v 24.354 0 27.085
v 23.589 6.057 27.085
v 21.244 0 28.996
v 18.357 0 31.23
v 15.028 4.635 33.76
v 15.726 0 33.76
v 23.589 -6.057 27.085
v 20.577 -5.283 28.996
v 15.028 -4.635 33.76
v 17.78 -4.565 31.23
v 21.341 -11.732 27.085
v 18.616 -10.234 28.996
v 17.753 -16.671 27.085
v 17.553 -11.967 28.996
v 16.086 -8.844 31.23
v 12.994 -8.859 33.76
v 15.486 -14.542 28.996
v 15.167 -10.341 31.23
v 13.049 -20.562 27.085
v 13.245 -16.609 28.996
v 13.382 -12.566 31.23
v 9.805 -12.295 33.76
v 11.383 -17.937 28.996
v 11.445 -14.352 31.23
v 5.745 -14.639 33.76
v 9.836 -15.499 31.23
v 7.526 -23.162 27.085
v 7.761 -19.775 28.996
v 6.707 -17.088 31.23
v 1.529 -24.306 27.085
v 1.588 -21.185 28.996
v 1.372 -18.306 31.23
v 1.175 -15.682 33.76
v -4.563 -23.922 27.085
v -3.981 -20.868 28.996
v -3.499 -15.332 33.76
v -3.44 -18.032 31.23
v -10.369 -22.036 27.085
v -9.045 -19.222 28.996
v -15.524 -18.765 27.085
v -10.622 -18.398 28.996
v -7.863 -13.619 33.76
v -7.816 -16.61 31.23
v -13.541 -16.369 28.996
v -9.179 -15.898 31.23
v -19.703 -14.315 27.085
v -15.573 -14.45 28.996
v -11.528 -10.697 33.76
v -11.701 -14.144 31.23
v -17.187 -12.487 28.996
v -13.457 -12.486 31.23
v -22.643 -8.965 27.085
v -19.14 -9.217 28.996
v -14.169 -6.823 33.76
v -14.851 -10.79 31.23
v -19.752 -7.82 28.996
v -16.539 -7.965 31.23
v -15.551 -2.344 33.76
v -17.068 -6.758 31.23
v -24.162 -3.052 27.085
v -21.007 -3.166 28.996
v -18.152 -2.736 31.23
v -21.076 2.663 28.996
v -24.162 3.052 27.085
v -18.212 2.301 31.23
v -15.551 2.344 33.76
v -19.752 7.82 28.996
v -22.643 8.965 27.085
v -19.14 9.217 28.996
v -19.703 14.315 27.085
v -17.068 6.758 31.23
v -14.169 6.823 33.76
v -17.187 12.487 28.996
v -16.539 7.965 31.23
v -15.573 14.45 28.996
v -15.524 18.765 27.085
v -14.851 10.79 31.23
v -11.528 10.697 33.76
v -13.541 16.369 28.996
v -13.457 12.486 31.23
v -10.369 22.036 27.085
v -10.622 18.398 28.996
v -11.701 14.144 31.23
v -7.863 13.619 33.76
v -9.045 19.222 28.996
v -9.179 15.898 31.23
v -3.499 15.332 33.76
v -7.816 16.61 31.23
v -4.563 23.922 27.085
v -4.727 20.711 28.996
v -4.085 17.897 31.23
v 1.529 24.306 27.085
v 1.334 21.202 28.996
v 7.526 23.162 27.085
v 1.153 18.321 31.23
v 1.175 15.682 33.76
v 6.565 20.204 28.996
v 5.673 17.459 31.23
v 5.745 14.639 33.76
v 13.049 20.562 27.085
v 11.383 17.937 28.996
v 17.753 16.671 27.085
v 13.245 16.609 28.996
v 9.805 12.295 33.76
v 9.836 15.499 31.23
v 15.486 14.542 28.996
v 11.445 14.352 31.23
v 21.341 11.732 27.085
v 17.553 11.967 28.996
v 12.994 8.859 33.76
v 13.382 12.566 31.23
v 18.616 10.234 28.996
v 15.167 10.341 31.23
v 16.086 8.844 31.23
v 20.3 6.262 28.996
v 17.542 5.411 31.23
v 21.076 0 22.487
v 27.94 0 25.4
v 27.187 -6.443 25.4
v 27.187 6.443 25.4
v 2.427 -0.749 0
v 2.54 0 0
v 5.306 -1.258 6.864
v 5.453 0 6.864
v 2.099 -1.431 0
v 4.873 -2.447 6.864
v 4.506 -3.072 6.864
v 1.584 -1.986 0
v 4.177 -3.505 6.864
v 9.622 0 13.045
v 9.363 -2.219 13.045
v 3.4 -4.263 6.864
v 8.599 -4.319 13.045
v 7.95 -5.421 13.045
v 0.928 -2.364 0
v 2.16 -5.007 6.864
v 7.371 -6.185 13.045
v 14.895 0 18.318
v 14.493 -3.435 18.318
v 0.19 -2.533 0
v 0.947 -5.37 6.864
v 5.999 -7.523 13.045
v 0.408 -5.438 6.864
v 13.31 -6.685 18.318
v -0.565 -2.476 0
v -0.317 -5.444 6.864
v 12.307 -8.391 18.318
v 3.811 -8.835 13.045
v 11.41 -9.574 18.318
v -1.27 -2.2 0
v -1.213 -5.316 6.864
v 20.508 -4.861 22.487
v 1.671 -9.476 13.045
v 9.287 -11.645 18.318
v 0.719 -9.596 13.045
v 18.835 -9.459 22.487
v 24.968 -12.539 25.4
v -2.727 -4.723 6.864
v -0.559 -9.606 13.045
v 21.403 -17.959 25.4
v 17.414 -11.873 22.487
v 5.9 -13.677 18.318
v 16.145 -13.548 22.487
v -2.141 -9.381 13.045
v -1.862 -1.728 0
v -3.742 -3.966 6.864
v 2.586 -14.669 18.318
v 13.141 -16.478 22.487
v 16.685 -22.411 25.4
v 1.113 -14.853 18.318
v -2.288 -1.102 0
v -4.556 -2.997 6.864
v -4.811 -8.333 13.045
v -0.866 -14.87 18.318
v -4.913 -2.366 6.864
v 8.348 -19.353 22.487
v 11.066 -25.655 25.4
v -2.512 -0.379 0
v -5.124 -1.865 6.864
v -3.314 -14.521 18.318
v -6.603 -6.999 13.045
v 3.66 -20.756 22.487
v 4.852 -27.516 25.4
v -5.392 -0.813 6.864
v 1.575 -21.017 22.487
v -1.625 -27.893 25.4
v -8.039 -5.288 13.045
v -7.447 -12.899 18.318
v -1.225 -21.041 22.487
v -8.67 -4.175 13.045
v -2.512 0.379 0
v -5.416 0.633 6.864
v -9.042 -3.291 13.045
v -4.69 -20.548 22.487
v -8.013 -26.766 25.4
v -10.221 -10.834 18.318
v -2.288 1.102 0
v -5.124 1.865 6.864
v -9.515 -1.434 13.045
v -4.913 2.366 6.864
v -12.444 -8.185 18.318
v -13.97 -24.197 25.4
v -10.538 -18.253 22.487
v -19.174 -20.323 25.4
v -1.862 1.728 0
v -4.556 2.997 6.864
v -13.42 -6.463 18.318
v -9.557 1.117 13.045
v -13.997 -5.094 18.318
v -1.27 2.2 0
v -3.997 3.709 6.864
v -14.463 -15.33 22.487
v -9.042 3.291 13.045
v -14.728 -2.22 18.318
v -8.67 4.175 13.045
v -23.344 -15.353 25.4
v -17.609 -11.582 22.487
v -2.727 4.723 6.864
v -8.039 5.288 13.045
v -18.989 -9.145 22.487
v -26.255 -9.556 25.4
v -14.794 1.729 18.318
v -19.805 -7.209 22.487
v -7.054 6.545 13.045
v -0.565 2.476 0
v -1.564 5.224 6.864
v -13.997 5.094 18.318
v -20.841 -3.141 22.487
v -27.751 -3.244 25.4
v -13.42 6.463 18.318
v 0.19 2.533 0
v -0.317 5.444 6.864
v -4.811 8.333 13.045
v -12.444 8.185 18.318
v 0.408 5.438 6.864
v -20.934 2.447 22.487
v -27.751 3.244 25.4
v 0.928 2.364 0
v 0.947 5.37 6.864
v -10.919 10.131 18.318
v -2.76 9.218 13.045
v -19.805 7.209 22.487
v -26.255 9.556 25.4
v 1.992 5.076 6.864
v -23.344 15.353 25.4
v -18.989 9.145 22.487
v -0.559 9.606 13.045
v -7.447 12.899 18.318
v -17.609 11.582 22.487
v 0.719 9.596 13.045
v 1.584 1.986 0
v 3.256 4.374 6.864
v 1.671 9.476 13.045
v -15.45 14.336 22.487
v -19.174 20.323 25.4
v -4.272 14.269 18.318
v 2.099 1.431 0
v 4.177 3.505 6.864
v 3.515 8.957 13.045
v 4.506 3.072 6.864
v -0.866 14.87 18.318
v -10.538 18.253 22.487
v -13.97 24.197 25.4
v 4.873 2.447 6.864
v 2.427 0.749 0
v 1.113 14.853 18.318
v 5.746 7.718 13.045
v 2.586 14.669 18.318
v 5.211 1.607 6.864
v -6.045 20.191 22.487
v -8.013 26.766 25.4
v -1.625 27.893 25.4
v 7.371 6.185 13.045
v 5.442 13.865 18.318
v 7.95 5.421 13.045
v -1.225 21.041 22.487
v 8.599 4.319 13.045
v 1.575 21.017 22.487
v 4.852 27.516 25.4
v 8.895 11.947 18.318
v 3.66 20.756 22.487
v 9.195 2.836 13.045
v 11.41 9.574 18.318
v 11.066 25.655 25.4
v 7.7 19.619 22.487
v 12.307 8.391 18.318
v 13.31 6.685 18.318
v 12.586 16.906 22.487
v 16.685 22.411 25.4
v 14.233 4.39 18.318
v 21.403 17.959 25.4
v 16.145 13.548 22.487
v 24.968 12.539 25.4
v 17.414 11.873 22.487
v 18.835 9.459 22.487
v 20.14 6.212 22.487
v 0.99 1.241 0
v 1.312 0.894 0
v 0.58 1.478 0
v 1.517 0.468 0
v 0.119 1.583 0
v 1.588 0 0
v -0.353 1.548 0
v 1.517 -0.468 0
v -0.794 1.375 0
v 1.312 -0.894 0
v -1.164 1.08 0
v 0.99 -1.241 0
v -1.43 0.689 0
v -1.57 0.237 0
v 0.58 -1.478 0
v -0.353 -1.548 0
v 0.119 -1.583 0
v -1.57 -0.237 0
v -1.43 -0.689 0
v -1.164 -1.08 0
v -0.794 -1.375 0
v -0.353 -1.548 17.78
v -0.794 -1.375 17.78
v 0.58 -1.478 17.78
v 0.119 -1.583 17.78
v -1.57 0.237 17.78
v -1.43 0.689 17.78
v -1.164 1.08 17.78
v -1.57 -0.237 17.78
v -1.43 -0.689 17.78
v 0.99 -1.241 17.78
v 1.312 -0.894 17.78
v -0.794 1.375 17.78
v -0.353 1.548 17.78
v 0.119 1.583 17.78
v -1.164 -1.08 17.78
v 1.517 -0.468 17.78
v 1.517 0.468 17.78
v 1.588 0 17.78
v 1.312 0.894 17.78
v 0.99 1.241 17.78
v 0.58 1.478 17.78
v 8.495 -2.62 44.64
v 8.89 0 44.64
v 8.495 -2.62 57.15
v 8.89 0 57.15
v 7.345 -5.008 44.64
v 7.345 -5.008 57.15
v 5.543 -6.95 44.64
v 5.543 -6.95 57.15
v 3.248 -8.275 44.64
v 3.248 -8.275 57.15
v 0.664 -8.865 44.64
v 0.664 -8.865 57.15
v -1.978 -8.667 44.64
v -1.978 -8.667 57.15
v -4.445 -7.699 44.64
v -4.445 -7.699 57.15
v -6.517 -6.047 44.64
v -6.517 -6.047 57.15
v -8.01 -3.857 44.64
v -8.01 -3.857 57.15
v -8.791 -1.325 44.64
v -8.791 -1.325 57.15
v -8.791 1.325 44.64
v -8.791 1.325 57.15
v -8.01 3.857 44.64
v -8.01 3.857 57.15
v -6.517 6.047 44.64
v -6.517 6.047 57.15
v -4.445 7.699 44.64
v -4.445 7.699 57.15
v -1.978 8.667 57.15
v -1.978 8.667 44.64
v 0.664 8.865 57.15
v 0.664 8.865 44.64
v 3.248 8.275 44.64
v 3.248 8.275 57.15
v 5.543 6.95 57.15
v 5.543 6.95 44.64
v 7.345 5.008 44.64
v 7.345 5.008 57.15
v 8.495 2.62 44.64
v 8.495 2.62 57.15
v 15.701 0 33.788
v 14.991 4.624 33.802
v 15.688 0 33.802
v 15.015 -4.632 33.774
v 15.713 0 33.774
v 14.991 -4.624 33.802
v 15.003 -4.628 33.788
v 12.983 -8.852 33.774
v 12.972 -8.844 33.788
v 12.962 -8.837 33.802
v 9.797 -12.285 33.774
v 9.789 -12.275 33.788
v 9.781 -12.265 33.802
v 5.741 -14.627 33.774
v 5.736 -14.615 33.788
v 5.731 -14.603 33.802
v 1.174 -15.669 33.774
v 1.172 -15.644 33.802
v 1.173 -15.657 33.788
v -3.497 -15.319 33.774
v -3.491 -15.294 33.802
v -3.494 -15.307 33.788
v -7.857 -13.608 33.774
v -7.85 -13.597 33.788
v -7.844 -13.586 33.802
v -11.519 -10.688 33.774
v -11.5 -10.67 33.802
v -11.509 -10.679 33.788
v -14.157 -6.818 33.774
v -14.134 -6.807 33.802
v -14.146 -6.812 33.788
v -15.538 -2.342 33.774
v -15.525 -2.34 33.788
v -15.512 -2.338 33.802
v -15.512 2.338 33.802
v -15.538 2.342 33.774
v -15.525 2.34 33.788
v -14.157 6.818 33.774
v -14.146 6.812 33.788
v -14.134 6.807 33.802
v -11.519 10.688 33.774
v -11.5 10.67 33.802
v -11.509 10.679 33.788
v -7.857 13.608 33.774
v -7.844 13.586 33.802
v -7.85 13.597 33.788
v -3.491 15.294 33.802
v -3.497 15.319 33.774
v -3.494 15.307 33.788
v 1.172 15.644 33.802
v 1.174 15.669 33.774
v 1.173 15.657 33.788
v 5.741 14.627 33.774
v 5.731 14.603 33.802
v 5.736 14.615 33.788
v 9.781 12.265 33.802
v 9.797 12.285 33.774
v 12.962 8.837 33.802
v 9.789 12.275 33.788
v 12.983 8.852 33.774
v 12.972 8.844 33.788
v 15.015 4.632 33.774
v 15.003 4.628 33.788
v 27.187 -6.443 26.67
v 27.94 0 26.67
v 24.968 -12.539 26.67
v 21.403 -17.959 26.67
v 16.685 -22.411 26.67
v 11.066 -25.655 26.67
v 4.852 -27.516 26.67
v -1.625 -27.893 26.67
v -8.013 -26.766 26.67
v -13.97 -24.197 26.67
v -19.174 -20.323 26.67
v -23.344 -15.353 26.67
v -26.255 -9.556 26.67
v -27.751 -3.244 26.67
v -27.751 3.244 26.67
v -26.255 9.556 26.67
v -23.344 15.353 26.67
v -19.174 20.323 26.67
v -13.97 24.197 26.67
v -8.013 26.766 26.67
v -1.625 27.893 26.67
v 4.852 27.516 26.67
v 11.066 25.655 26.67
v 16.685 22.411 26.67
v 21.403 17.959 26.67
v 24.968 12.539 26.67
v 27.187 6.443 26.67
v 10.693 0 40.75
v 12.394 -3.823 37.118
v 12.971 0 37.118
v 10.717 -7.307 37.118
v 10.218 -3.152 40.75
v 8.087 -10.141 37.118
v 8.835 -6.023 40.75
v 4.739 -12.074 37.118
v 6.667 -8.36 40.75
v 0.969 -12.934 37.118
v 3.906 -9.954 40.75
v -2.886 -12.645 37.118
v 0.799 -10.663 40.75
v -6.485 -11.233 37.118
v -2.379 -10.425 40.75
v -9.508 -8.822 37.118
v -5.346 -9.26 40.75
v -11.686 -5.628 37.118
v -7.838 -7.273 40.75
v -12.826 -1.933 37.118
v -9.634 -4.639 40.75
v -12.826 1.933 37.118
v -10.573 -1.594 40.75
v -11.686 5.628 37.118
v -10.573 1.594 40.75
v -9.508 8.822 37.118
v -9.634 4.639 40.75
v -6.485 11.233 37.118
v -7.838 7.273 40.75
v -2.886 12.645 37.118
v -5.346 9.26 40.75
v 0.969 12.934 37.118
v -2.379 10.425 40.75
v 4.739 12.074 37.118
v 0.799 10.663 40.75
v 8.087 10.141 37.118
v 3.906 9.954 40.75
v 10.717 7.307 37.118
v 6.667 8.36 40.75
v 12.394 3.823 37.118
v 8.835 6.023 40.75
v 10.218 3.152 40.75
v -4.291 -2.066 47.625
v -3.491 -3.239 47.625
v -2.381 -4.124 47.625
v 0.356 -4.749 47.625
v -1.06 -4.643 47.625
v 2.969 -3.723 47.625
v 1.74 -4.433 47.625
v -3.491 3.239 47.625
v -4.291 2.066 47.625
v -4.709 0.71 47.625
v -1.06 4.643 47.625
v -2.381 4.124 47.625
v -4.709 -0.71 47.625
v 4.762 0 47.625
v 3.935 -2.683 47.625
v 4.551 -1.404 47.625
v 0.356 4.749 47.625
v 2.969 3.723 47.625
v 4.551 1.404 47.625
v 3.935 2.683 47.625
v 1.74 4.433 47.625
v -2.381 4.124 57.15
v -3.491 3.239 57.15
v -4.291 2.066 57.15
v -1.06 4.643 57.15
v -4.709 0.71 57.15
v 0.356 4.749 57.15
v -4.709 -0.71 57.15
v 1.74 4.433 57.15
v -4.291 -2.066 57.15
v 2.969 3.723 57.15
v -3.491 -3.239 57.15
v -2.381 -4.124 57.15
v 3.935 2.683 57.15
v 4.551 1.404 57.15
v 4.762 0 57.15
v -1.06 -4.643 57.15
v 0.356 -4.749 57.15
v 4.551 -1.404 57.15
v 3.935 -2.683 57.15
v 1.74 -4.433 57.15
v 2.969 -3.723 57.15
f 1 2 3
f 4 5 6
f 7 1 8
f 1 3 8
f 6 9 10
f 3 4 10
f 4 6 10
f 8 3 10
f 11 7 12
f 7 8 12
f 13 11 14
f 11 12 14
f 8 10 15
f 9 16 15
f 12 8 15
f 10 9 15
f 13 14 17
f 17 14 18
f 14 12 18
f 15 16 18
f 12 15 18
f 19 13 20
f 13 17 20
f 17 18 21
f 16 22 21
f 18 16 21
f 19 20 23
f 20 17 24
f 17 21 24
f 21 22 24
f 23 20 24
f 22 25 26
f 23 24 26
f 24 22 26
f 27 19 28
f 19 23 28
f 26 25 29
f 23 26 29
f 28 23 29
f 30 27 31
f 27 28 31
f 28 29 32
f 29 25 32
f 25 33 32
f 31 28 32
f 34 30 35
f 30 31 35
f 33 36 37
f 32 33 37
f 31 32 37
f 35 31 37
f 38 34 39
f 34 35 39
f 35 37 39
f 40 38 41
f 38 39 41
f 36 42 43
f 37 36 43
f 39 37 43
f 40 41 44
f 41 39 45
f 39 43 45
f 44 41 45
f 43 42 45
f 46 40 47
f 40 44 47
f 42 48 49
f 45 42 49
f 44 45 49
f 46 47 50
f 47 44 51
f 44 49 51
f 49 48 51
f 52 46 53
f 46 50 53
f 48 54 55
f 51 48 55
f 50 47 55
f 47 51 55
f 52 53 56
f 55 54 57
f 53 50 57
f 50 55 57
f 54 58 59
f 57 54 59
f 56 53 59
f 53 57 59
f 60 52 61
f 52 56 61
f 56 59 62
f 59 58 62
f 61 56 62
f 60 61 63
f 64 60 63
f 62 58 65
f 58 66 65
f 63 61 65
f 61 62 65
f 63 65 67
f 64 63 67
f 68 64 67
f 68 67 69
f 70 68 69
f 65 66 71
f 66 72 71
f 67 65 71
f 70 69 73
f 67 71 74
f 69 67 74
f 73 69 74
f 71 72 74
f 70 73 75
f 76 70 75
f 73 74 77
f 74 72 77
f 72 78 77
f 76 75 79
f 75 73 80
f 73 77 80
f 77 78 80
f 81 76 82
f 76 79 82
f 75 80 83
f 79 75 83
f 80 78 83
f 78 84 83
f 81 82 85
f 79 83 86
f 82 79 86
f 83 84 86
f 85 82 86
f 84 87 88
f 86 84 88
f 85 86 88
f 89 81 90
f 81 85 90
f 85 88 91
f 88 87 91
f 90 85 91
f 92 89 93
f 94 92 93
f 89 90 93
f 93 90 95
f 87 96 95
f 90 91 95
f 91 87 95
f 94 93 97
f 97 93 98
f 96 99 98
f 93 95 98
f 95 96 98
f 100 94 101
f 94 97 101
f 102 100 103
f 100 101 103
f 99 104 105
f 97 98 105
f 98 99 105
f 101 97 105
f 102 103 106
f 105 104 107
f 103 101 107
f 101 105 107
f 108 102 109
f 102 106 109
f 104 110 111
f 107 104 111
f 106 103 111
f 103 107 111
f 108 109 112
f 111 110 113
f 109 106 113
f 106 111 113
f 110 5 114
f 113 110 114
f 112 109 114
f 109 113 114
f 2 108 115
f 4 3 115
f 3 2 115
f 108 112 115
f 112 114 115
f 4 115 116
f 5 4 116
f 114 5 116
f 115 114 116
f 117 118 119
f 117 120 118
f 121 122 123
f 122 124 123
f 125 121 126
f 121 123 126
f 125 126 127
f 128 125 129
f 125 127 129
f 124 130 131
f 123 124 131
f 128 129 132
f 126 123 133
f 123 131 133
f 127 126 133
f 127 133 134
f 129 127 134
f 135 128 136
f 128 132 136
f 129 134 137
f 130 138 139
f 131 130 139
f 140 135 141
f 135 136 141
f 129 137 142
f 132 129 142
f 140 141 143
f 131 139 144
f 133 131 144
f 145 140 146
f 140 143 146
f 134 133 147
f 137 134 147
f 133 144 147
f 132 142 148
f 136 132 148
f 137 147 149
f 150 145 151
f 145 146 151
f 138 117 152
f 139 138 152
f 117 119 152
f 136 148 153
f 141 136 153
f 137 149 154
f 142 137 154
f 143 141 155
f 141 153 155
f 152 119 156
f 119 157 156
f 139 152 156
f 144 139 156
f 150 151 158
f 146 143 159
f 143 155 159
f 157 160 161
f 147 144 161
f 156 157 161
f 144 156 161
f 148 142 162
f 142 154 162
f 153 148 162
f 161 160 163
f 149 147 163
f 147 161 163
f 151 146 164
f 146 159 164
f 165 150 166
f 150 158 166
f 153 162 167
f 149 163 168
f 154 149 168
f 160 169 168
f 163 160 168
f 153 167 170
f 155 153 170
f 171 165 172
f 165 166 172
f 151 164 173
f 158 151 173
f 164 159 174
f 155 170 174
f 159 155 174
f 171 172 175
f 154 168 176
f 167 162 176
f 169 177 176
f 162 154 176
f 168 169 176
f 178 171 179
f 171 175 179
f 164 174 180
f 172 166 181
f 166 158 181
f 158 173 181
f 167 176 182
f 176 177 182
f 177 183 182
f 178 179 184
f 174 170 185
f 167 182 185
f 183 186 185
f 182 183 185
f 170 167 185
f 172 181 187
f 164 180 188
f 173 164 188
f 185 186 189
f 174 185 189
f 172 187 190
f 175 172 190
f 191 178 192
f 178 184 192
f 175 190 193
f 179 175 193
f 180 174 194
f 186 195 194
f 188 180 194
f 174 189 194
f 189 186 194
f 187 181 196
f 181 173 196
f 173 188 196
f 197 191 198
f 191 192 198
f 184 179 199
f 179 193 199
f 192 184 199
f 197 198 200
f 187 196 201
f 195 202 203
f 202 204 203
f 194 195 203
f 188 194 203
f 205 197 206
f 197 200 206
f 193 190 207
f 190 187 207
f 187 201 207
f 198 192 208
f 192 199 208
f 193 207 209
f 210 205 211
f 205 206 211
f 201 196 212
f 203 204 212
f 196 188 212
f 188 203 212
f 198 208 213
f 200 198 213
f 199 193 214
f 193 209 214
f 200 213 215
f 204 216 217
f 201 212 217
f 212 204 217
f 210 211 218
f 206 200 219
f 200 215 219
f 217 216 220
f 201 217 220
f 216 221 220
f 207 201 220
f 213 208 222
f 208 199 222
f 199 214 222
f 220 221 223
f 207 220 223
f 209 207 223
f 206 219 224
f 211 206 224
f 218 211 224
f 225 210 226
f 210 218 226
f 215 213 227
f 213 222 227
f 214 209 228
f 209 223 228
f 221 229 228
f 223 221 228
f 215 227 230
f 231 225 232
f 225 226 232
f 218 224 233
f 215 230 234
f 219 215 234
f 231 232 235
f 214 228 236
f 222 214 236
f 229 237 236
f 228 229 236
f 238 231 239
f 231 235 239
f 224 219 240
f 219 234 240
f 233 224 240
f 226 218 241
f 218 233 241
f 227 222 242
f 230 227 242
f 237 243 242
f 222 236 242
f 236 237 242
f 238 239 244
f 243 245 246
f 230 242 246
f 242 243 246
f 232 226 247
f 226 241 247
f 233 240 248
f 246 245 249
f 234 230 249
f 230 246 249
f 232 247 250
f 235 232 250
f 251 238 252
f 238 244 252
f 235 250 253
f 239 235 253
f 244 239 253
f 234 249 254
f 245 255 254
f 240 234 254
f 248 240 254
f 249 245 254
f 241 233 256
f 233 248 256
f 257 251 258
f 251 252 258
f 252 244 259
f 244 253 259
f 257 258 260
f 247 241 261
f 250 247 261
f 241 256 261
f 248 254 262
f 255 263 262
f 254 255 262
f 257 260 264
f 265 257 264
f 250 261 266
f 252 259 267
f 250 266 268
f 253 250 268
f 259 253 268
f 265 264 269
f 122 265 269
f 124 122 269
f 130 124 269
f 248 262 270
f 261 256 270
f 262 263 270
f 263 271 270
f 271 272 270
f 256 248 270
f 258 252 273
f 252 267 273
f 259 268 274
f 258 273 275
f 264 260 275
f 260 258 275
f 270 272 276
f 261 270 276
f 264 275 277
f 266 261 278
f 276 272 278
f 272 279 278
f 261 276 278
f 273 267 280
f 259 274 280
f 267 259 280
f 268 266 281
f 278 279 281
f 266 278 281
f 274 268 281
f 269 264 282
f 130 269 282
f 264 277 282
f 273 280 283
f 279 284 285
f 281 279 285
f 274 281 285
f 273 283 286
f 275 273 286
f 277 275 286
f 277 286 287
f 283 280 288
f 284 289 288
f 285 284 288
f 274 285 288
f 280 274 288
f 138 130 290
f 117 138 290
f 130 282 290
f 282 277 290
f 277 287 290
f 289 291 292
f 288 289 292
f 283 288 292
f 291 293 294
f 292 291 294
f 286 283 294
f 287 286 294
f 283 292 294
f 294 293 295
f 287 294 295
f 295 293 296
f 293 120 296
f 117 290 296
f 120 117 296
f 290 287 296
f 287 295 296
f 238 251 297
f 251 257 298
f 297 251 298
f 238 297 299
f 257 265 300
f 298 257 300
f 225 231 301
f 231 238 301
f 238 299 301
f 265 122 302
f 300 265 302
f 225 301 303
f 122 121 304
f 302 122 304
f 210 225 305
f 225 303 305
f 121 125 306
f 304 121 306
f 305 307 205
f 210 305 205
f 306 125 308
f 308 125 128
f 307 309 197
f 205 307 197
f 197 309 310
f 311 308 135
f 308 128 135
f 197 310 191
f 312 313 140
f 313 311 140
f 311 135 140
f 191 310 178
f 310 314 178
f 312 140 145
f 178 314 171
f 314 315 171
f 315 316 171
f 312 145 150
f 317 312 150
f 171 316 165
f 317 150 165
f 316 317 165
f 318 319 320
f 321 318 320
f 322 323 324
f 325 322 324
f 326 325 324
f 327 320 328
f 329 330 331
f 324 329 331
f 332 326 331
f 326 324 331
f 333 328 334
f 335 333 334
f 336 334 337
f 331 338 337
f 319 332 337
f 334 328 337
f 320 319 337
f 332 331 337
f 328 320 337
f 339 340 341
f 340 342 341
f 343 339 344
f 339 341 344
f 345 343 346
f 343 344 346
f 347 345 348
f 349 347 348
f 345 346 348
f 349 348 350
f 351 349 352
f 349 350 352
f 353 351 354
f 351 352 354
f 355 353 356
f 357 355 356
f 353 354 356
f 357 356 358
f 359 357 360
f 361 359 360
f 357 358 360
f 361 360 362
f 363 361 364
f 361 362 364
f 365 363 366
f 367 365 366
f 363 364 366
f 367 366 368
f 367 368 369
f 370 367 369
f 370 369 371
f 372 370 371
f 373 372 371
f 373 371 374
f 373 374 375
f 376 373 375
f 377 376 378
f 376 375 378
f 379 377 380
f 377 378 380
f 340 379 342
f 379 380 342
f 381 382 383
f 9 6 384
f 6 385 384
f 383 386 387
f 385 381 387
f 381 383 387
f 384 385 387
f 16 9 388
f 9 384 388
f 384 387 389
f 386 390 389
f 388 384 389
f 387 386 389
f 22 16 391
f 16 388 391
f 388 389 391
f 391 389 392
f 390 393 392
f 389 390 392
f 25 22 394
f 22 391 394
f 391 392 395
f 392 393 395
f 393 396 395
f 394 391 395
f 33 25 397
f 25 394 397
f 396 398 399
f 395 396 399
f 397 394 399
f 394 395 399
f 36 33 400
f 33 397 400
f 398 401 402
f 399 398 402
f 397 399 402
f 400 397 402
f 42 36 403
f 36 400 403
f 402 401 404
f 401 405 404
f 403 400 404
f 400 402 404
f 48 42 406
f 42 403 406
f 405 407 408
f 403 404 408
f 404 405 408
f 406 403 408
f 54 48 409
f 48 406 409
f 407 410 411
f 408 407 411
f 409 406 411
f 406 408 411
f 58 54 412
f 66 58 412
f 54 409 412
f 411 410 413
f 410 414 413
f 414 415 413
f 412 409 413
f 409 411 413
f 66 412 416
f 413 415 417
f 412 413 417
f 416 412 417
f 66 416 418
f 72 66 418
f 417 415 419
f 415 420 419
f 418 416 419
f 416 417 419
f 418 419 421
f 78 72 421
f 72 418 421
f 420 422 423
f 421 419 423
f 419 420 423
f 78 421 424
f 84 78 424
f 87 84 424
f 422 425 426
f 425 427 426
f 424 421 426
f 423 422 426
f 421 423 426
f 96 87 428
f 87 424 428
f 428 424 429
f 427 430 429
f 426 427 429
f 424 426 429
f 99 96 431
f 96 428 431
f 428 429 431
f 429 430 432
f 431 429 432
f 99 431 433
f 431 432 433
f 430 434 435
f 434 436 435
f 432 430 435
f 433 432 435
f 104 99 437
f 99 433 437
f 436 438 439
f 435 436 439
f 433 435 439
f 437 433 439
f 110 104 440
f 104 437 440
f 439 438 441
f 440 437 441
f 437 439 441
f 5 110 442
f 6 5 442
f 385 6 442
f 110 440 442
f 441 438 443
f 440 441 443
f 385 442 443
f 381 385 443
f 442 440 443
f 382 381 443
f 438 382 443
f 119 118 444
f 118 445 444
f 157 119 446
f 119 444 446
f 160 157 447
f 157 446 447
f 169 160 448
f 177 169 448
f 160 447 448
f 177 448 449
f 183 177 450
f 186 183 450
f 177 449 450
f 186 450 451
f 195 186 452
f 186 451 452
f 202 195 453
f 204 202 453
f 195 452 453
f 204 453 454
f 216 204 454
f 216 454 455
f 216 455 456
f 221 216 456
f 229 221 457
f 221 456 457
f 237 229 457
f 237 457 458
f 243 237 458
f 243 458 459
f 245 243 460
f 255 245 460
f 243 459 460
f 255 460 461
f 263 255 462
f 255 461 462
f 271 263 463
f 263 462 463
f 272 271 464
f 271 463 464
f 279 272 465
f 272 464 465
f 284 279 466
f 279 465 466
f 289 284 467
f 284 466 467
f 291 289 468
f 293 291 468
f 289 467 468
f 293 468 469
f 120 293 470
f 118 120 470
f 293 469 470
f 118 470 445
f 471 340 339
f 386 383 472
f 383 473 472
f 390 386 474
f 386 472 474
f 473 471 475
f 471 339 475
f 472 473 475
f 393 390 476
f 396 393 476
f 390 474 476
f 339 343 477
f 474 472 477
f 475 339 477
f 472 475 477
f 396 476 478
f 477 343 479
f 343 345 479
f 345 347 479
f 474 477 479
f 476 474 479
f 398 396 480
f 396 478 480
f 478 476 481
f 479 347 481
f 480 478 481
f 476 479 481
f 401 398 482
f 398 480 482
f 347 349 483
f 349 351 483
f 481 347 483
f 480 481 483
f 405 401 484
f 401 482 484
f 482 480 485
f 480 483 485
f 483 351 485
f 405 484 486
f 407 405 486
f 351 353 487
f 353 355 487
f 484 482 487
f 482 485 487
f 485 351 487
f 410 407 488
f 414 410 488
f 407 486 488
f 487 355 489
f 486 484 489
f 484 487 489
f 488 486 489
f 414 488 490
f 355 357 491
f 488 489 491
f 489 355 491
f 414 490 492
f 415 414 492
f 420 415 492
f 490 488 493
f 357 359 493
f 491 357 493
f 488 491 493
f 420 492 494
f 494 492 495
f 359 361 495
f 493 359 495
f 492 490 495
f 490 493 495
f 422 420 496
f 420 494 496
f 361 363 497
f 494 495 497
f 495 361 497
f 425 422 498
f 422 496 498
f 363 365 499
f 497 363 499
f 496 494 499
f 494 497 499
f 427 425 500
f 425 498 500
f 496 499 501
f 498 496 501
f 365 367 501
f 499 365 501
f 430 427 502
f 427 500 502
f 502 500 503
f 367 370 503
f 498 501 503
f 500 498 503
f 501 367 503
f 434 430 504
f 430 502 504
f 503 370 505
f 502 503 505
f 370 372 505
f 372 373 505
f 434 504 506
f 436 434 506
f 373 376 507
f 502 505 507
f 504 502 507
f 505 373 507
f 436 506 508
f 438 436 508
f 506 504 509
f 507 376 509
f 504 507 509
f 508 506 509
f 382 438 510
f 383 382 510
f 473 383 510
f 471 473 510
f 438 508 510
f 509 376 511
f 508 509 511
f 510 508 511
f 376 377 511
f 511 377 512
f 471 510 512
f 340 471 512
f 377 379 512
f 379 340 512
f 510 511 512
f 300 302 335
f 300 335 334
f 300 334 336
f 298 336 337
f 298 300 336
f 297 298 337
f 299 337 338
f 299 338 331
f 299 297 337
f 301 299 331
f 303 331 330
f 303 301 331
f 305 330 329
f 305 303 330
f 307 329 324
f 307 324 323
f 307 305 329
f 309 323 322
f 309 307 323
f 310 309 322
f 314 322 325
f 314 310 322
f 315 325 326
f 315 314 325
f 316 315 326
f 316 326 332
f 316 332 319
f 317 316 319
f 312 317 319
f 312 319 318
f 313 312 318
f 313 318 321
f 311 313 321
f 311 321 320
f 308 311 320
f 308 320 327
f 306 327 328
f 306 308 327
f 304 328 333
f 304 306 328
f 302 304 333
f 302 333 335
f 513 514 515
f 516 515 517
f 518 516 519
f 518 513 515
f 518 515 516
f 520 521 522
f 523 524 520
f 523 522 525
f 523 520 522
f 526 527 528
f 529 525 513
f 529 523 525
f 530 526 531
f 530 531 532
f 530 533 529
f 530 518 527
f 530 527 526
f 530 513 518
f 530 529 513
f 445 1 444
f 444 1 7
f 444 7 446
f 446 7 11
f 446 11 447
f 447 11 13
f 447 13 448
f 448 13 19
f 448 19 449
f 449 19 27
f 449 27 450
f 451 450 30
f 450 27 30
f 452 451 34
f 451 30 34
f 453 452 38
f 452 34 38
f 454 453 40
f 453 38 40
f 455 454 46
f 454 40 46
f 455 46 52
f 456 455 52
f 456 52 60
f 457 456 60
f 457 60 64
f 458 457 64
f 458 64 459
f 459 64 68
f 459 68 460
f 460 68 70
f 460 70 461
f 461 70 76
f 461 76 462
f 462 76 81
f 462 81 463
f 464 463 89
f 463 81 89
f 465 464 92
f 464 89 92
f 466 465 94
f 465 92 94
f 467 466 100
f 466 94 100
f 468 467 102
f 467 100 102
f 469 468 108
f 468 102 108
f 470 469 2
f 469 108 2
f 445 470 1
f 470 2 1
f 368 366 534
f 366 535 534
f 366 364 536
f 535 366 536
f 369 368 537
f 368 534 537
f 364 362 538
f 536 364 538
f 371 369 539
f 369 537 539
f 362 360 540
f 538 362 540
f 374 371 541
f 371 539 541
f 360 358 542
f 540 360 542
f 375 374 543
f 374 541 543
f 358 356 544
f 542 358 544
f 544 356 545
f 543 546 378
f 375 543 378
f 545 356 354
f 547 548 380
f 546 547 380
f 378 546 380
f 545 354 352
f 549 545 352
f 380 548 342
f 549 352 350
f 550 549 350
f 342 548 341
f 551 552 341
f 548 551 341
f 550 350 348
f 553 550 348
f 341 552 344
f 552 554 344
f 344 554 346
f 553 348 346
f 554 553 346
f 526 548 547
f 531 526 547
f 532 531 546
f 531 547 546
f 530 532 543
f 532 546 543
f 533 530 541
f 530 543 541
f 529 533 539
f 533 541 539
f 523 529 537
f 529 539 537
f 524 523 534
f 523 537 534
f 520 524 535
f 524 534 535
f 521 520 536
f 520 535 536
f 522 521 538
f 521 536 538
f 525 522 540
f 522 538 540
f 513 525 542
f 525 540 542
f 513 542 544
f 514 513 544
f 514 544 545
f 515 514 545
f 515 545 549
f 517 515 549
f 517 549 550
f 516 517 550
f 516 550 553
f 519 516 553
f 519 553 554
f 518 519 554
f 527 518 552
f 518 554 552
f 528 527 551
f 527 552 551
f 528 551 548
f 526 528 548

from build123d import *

# Parameters (mm, degrees)
F2_R     = 1.5875
F4_DEPTH = 17.78
F3_R     = 4.7625
F5_DEPTH = 9.525


with BuildPart() as f1:
    # F0 (on Front) → F1 (revolve)
    with BuildSketch(Plane.XZ):
        with BuildLine():
            ThreePointArc((2.54, 0), (12.131985, 15.808015), (27.94, 25.4))
            Line((27.94, 25.4), (27.94, 26.67))
            Line((27.94, 26.67), (24.353637, 27.084503))
            ThreePointArc((24.353637, 27.084503), (19.770494, 30.074042), (15.726336, 33.760141))
            ThreePointArc((15.726336, 33.760141), (15.70698, 33.780889), (15.687641, 33.801654))
            ThreePointArc((15.687641, 33.801654), (11.774382, 38.898264), (8.89, 44.640161))
            Line((8.89, 44.640161), (8.89, 57.15))
            Line((8.89, 57.15), (0, 57.15))
            Line((0, 57.15), (0, 0))
            Line((0, 0), (2.54, 0))
        make_face()
    revolve(axis=Axis((0, 0, 28.575), (0, 0, -1)))

    # F2 (on Top) → F4 (cut)
    with BuildSketch(Plane.XY):
        Circle(F2_R)
    extrude(amount=F4_DEPTH, mode=Mode.SUBTRACT)

    # F3 (on face) → F5 (cut)
    with BuildSketch(Plane.XY.offset(57.15)):
        Circle(F3_R)
    extrude(amount=-F5_DEPTH, mode=Mode.SUBTRACT)


solid = f1.part
